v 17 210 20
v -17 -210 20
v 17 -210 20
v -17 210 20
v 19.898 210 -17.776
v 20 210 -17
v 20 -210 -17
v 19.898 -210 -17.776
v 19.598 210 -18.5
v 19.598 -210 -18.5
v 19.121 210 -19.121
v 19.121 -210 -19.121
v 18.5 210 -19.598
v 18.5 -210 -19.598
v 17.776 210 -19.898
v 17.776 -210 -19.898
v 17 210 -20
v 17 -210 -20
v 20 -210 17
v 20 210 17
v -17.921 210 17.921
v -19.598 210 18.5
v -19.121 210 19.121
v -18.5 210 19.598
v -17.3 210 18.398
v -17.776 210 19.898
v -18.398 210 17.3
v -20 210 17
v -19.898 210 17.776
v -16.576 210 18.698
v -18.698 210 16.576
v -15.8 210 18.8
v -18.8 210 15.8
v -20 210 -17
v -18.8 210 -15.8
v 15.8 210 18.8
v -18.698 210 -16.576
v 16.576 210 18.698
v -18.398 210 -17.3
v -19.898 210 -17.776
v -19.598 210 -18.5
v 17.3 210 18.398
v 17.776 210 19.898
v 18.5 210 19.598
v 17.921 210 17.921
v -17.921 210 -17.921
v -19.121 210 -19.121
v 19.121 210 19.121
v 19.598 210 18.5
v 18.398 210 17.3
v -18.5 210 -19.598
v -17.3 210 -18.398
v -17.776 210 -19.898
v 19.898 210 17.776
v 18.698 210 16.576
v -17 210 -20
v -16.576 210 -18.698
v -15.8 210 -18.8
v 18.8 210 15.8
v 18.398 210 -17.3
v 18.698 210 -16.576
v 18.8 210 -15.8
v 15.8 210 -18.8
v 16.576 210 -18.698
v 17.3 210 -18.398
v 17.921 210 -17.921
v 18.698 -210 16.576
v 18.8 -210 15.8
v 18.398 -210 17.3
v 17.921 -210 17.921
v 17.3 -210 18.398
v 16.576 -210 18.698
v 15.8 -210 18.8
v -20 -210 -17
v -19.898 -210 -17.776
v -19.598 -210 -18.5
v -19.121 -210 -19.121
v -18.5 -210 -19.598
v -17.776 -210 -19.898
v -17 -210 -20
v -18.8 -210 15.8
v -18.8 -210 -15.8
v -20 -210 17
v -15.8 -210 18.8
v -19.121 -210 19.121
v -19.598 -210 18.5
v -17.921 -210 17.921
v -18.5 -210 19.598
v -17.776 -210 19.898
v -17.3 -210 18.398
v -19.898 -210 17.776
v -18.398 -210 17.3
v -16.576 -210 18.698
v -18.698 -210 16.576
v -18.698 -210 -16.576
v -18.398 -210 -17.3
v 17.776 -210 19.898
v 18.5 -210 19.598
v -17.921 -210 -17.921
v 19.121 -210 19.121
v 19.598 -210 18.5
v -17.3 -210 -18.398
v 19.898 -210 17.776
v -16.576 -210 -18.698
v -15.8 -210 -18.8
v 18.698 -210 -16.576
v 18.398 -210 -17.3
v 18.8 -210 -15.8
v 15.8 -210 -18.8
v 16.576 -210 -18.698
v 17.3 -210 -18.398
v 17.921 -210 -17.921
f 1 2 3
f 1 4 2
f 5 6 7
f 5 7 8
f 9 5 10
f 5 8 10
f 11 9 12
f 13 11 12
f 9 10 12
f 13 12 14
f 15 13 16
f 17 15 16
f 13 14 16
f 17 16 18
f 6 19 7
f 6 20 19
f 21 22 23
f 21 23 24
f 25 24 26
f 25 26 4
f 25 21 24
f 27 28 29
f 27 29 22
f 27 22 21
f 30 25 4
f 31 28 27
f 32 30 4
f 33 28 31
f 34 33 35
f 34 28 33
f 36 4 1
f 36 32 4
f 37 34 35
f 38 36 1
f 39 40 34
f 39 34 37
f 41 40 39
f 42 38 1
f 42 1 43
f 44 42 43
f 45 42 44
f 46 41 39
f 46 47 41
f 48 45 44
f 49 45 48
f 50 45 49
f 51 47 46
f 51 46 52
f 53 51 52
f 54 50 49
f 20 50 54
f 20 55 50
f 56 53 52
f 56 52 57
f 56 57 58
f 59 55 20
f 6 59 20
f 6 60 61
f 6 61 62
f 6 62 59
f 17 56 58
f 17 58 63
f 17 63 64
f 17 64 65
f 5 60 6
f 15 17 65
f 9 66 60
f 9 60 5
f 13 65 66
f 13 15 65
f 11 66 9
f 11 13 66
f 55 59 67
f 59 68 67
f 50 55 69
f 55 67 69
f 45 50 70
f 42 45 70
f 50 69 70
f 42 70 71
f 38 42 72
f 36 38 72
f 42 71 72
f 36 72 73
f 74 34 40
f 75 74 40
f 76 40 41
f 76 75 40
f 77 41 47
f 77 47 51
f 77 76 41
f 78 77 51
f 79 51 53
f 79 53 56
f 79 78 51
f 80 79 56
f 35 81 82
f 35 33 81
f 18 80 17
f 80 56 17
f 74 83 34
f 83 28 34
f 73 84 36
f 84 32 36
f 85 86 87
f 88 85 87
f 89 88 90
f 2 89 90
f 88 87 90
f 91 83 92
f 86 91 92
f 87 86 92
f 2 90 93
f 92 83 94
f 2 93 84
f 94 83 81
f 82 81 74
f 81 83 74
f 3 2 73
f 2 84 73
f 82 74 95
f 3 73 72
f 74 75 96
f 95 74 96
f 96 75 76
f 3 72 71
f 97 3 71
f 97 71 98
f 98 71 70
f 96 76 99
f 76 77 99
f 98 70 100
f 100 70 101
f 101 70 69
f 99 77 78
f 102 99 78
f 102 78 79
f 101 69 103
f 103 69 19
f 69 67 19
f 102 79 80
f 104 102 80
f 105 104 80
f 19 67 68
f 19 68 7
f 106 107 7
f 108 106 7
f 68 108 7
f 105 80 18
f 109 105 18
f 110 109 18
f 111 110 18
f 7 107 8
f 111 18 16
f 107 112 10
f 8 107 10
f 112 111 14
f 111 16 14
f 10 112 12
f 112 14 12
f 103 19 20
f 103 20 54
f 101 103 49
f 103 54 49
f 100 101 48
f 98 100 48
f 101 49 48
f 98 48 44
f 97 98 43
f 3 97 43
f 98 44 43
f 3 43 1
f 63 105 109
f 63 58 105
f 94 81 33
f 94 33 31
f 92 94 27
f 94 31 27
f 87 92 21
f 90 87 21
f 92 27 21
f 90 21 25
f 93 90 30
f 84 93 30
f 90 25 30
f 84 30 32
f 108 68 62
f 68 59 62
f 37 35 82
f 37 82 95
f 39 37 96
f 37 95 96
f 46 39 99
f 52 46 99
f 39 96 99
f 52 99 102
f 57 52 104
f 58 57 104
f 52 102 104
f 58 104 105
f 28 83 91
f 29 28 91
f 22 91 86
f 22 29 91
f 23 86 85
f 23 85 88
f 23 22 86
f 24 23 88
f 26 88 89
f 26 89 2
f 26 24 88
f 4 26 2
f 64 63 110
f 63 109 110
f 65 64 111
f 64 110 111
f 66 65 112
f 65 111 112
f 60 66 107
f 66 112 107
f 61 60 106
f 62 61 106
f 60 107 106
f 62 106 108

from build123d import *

# Parameters (mm, degrees)
ESBO_O1_W                = 40
ESBO_O1_H                = 40
ESBO_O1_W_2              = 37.6
ESBO_O1_H_2              = 37.6
RESSALTO_EXTRUS_O1_DEPTH = 210
FILETE1_R                = 3


with BuildPart() as part:
    # Esboço1 → Ressalto-extrusão1 (new, symmetric)
    with BuildSketch(Plane(origin=(0, 0, 0), x_dir=(1, 0, 0), z_dir=(0, 1, 0))):
        Rectangle(ESBO_O1_W, ESBO_O1_H)
        Rectangle(ESBO_O1_W_2, ESBO_O1_H_2, mode=Mode.SUBTRACT)
    extrude(amount=RESSALTO_EXTRUS_O1_DEPTH, both=True)

    # Filete1
    filete1_edges = [part.edges().sort_by_distance(p)[0] for p in [
        (-18.8, 0, 18.8),
        (18.8, 0, 18.8),
        (18.8, 0, -18.8),
        (-18.8, 0, -18.8),
        (-20, 0, -20),
        (20, 0, -20),
        (20, 0, 20),
        (-20, 0, 20),
    ]]
    fillet(filete1_edges, radius=FILETE1_R)


solid = part.part
